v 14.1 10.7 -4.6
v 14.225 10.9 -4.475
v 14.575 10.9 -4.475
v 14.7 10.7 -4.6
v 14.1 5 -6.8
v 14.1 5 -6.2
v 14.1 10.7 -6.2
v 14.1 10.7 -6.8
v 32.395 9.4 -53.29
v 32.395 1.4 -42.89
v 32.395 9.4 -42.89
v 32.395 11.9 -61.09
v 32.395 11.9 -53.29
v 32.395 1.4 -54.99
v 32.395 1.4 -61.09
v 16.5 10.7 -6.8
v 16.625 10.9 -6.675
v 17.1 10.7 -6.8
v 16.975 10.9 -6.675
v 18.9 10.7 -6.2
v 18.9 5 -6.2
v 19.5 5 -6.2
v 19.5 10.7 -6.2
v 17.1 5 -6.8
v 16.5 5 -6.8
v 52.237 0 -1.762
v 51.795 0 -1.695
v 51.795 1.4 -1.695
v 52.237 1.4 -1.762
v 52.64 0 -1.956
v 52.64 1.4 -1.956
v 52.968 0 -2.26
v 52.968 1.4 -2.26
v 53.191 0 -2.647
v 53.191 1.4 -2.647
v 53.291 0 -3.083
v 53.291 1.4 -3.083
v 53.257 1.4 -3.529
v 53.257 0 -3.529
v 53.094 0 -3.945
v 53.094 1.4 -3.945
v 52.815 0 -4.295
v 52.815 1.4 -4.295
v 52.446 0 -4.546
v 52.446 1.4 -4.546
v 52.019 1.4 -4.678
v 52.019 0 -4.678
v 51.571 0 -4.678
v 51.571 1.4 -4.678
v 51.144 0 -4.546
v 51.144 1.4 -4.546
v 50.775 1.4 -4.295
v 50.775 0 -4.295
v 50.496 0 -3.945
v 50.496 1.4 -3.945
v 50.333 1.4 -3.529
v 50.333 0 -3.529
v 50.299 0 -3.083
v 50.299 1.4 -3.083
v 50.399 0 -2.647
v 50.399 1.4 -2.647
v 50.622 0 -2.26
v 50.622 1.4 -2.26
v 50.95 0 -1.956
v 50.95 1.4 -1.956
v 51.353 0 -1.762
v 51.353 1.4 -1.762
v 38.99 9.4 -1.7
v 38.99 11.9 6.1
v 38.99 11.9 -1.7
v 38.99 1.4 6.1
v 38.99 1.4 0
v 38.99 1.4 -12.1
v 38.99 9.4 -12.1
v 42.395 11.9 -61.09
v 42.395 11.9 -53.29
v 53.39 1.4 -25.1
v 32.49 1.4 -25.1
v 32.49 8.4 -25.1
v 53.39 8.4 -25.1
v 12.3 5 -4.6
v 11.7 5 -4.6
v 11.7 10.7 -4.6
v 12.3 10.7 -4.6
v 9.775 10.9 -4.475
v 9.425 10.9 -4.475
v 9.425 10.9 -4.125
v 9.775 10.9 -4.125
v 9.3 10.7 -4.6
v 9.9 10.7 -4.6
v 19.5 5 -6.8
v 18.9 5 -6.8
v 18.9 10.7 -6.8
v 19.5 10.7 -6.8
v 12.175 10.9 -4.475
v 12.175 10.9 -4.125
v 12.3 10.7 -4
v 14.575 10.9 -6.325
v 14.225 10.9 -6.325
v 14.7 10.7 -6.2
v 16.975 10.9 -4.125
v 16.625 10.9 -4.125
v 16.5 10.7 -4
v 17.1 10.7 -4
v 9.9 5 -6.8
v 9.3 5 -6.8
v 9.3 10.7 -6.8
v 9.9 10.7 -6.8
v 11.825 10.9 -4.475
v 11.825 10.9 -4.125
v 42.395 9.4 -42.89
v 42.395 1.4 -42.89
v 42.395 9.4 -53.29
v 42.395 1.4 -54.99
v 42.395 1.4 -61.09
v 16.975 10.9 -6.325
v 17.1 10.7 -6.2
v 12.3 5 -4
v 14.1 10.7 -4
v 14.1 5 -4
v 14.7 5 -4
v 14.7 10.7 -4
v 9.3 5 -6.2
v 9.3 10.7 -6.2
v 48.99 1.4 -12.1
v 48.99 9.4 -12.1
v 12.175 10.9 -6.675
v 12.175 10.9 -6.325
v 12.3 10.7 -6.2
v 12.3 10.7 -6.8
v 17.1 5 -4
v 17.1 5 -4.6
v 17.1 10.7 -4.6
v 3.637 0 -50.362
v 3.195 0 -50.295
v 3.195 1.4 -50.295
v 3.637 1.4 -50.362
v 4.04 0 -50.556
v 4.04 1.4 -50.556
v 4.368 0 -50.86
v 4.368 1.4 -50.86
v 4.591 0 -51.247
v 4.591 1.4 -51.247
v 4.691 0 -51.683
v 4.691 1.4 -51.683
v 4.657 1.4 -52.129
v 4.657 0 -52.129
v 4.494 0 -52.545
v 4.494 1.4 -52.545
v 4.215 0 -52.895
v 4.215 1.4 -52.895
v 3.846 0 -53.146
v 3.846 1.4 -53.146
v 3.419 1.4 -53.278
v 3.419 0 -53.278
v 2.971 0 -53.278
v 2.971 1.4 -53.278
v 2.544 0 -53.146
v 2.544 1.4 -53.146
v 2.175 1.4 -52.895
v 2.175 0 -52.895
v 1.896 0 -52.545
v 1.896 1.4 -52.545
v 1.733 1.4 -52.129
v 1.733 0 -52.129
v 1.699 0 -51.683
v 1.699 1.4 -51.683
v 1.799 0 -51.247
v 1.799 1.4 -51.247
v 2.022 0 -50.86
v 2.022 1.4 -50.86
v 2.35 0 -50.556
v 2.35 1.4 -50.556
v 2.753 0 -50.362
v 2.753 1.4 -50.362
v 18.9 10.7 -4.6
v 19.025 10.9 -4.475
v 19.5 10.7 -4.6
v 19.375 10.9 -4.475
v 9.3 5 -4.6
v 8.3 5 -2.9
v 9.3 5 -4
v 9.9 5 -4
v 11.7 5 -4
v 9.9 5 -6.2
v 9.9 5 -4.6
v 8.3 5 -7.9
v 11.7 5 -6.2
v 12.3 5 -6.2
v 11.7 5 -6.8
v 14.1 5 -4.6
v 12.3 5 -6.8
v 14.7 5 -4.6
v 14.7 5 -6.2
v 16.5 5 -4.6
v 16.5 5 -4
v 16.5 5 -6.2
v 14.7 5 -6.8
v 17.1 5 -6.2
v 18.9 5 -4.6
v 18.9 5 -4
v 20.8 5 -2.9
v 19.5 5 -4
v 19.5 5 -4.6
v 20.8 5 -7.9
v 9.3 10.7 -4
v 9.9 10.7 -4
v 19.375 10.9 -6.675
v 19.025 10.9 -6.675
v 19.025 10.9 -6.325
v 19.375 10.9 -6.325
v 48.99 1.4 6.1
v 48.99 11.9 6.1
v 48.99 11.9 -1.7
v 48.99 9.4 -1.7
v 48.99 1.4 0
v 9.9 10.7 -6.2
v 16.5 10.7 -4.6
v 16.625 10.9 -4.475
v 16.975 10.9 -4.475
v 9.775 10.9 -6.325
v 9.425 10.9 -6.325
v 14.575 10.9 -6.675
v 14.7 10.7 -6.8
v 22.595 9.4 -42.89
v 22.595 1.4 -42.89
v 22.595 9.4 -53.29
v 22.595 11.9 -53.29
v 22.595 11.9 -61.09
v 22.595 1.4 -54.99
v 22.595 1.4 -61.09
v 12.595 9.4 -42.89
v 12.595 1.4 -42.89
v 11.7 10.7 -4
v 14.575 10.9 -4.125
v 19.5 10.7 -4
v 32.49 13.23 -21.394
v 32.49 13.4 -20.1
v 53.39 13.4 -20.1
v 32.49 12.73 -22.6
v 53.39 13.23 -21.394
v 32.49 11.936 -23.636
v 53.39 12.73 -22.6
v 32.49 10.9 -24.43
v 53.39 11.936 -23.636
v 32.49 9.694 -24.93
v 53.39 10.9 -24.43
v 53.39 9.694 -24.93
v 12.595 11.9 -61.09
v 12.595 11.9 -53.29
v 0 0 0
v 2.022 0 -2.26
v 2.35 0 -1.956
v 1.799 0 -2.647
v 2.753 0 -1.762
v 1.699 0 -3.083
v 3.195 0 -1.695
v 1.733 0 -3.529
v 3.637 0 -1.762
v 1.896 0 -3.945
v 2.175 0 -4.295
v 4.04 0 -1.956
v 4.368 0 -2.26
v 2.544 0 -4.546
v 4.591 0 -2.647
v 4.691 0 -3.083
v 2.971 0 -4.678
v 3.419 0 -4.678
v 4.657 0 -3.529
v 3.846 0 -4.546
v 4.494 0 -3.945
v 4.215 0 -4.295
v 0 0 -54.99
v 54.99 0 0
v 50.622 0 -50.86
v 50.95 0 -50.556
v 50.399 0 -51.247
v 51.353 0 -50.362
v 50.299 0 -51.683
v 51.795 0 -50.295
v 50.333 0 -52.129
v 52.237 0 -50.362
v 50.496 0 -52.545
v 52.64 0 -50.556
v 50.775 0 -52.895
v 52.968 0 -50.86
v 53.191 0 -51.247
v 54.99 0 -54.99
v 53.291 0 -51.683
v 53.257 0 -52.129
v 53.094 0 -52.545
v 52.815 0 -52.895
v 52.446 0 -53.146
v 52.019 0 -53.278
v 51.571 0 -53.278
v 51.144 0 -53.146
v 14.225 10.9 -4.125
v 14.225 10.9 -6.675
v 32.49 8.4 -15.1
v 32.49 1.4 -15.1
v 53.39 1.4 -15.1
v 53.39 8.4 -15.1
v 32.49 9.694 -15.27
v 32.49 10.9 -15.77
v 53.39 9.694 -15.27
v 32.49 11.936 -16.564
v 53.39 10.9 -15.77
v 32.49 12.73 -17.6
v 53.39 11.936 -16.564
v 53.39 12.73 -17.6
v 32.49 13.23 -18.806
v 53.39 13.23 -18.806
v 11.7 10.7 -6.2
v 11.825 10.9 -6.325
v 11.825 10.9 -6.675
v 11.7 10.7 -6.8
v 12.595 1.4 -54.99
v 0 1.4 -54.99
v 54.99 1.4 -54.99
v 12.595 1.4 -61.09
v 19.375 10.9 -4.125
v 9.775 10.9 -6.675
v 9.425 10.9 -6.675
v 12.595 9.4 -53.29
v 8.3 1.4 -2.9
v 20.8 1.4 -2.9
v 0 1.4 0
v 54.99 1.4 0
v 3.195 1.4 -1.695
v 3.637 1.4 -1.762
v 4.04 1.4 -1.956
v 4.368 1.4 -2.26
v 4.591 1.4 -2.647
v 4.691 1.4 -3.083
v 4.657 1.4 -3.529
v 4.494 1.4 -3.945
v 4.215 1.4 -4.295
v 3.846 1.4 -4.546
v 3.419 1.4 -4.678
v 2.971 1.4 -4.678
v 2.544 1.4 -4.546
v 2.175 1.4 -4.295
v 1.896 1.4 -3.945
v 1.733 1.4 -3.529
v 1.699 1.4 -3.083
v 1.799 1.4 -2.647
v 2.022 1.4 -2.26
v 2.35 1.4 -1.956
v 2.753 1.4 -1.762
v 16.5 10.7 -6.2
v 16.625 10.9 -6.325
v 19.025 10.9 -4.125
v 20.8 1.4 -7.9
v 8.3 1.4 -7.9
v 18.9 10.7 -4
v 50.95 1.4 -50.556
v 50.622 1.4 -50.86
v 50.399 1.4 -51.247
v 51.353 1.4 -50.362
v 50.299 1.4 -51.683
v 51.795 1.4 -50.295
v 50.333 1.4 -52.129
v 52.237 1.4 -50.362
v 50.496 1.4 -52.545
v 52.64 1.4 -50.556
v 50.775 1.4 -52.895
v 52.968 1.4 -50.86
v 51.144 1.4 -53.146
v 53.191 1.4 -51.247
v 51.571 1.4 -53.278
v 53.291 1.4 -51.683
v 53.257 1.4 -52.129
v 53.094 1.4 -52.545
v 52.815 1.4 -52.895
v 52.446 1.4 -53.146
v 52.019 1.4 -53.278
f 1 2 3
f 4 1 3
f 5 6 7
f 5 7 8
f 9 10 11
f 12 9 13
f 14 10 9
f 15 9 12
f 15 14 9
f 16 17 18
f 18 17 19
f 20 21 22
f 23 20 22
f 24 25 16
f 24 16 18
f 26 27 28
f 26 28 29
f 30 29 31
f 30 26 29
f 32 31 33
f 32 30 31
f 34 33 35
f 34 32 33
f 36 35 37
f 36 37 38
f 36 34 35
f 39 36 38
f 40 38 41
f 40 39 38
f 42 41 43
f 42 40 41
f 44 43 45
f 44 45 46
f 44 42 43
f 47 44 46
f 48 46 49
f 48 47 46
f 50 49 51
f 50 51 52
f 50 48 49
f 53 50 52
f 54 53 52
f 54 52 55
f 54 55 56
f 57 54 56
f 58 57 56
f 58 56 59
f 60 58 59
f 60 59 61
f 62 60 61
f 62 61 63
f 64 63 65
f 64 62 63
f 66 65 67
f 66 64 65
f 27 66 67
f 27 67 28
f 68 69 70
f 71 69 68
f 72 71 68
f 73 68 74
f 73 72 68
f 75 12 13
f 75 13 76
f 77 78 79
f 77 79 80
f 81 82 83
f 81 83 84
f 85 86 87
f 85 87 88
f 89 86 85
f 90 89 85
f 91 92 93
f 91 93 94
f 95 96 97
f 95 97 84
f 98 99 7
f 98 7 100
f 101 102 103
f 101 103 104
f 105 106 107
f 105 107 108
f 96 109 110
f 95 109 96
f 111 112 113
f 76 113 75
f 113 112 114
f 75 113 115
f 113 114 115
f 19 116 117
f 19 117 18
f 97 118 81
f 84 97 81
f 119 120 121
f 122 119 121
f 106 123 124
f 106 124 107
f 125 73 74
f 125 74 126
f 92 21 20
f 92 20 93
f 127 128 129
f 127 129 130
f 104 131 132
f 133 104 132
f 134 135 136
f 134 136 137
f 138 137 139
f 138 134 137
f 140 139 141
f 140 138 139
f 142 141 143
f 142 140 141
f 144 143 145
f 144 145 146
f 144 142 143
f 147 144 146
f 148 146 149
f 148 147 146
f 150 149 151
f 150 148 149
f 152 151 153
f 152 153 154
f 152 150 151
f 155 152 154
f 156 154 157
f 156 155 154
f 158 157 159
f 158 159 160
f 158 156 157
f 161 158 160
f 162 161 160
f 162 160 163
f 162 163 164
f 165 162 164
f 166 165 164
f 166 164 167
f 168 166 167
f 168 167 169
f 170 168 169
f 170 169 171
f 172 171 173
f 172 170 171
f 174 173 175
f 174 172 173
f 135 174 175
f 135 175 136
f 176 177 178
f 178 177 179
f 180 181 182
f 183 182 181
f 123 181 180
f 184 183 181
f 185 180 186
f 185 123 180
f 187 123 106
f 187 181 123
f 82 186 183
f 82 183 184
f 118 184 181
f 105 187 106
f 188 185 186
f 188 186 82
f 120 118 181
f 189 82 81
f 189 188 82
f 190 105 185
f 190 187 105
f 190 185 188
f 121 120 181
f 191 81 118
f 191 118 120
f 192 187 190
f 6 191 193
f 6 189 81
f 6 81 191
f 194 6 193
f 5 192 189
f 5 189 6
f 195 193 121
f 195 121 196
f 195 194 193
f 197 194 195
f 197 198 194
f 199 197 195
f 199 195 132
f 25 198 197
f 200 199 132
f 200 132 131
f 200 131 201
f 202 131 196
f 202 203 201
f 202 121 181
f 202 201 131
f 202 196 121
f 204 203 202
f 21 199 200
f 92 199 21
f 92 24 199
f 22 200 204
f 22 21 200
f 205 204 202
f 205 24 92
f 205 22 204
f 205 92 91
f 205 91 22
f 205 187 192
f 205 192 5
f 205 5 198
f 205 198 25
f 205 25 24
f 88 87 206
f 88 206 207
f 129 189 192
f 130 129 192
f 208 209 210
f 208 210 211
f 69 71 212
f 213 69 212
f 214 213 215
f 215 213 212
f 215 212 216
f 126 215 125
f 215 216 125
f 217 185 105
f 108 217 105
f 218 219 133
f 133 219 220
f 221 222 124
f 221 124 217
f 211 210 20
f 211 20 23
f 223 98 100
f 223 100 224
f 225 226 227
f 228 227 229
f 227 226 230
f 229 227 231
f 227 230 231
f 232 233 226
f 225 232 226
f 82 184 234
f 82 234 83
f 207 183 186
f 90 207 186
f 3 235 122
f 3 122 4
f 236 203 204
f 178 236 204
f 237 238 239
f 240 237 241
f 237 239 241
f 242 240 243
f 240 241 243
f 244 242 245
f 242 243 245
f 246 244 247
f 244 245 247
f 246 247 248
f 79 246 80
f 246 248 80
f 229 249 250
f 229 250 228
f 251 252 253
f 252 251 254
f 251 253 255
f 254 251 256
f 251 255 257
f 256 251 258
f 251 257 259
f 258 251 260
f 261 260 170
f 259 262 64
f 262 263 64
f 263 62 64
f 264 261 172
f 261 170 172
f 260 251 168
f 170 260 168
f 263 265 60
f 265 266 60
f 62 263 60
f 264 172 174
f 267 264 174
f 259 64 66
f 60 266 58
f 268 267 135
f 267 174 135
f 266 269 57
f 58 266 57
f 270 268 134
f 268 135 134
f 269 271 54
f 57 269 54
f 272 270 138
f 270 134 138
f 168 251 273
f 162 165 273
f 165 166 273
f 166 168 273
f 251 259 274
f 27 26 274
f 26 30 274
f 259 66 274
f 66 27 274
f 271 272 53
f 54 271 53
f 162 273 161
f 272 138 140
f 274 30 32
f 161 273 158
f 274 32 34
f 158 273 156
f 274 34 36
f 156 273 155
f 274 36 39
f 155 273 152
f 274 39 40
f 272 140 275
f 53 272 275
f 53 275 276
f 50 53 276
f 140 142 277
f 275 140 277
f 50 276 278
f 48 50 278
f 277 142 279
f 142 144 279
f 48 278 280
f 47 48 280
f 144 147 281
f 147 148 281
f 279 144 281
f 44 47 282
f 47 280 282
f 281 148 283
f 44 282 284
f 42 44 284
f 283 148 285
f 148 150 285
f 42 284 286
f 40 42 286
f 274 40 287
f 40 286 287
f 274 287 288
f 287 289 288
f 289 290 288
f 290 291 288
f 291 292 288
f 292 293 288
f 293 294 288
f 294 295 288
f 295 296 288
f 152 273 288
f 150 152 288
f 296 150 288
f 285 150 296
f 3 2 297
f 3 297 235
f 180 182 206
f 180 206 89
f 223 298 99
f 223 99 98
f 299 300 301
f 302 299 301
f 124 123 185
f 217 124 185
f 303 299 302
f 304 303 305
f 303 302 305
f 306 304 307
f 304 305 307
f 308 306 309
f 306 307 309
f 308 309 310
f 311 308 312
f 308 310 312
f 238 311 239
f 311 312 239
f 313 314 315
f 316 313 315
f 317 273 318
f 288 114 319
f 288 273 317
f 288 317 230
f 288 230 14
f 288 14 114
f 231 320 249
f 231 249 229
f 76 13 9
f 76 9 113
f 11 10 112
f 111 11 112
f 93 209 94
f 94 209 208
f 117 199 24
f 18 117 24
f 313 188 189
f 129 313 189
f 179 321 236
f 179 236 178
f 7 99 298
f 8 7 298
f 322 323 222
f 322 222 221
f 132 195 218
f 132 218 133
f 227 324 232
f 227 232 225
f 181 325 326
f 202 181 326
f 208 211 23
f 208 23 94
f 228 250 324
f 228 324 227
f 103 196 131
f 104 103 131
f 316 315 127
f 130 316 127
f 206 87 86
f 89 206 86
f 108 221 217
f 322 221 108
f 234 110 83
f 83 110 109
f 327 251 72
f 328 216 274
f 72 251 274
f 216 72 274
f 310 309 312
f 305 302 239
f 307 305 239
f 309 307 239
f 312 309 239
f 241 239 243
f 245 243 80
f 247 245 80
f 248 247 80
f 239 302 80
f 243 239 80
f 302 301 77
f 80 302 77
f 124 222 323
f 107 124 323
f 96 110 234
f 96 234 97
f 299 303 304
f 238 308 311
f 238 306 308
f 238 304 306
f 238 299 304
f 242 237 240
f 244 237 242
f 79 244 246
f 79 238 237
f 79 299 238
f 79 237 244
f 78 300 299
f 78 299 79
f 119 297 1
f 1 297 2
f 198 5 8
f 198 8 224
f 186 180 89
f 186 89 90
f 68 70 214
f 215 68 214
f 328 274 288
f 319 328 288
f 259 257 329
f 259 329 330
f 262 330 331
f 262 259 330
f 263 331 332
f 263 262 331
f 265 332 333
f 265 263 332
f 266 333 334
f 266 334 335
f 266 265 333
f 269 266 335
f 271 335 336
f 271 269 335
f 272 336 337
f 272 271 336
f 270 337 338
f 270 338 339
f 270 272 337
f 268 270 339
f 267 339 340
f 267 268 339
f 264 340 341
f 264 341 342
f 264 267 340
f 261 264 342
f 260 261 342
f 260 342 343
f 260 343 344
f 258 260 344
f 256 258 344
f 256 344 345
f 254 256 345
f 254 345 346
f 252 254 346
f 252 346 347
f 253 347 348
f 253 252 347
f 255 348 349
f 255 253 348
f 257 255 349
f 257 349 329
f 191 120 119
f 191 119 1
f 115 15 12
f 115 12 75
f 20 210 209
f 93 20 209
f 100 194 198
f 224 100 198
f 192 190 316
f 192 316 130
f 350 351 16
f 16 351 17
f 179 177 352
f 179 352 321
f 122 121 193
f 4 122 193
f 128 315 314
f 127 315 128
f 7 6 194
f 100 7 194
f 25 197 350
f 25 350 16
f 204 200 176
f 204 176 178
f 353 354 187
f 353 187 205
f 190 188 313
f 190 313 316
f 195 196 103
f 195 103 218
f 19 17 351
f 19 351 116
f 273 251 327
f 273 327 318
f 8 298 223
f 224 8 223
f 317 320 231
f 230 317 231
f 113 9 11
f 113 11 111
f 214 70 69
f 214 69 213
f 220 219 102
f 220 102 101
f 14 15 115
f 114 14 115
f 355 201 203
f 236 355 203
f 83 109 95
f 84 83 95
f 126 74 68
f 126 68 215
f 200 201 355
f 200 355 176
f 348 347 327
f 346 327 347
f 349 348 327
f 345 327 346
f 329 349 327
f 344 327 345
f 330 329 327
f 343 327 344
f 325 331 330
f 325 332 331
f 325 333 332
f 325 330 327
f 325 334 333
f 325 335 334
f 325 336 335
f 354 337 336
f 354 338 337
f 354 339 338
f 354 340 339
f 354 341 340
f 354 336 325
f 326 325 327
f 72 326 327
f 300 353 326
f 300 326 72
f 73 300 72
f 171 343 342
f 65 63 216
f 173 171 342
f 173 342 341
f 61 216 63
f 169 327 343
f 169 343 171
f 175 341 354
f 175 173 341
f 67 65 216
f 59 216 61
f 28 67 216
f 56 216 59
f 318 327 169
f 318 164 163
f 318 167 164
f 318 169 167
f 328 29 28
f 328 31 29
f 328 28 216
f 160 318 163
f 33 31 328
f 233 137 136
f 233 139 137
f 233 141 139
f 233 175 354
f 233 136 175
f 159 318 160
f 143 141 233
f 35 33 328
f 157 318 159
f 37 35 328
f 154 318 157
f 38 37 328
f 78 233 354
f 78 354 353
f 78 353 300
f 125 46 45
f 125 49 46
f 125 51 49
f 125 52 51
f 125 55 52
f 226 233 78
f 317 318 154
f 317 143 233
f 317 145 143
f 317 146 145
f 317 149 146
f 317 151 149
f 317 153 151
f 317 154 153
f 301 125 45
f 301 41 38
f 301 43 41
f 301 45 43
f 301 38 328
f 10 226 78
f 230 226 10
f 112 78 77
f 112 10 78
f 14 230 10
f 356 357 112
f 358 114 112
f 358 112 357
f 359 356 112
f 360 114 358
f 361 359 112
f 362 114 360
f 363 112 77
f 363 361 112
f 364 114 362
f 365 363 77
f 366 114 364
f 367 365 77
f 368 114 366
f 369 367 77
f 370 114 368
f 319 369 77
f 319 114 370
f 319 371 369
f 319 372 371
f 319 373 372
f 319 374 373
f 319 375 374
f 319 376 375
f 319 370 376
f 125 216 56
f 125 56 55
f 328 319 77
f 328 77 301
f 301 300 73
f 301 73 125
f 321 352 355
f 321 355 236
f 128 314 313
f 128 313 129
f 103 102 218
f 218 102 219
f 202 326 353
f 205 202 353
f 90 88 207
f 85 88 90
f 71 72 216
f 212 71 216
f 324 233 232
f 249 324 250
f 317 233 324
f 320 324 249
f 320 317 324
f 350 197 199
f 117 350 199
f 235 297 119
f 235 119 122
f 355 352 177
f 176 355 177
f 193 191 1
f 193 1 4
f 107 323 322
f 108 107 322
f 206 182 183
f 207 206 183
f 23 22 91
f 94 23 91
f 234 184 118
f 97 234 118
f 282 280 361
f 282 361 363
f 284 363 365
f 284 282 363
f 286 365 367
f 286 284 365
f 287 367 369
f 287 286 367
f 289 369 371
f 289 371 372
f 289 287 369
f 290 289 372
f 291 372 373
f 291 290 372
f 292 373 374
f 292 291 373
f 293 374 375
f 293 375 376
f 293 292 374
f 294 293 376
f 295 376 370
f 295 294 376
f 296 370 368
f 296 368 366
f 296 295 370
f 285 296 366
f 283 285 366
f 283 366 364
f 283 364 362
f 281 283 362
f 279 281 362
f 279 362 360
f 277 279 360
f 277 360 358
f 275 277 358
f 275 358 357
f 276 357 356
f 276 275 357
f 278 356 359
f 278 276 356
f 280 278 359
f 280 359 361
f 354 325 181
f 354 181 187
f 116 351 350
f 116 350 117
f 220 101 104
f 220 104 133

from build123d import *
from OCP.BRepFilletAPI import BRepFilletAPI_MakeChamfer

# Parameters (mm, degrees)
SKETCH1_W                   = 54.99
SKETCH1_H                   = 54.99
SKETCH1_R                   = 1.5
BOSS_EXTRUDE1_DEPTH         = 1.4
SKETCH2_W                   = 10
SKETCH2_H                   = 18.2
BOSS_EXTRUDE2_DEPTH         = 10.5
SKETCH3_W                   = 10
SKETCH3_H                   = 10.4
CUT_EXTRUDE1_DEPTH          = 2.5
SKETCH4_W                   = 12.5
SKETCH4_H                   = 5
BOSS_EXTRUDE4_DEPTH         = 3.6
SKETCH5_W                   = 0.6
SKETCH5_H                   = 0.6
BOSS_EXTRUDE5_DEPTH         = 5.9
CHAMFER1_SIZE               = 0.2
CHAMFER1_SIZE2              = 0.12497387
LPATTERN1_COUNT             = 5
LPATTERN1_PITCH             = 2.4
CHAMFER1_OF_LPATTERN1_SIZE  = 0.2
CHAMFER1_OF_LPATTERN1_SIZE2 = 0.12497387
SKETCH6_W                   = 20.9
SKETCH6_H                   = 10
BOSS_EXTRUDE6_DEPTH         = 12
CUT_EXTRUDE2_DEPTH          = 83.231625303


with BuildPart() as part:
    # Sketch1 → Boss-Extrude1 (new body)
    with BuildSketch(Plane(origin=(0, 0, 0), x_dir=(1, 0, 0), z_dir=(0, 1, 0))):
        with Locations((27.495, 27.495)):
            Rectangle(SKETCH1_W, SKETCH1_H)
        with Locations(Location((3.195, 51.795, 0), (0, 0, 270))):
            Circle(SKETCH1_R, mode=Mode.SUBTRACT)
        with Locations(Location((51.795, 51.795, 0), (0, 0, 270))):
            Circle(SKETCH1_R, mode=Mode.SUBTRACT)
        with Locations(Location((3.195, 3.195, 0), (0, 0, 270))):
            Circle(SKETCH1_R, mode=Mode.SUBTRACT)
        with Locations(Location((51.795, 3.195, 0), (0, 0, 270))):
            Circle(SKETCH1_R, mode=Mode.SUBTRACT)
    extrude(amount=BOSS_EXTRUDE1_DEPTH)

    # Sketch2 → Boss-Extrude2 (add)
    with BuildSketch(Plane(origin=(0, 1.4, 0), x_dir=(1, 0, 0), z_dir=(0, 1, 0))):
        with Locations((17.595, 51.99)):
            Rectangle(SKETCH2_W, SKETCH2_H)
        with Locations((37.395, 51.99)):
            Rectangle(SKETCH2_W, SKETCH2_H)
        with Locations((43.99, 3)):
            Rectangle(SKETCH2_W, SKETCH2_H)
    extrude(amount=BOSS_EXTRUDE2_DEPTH)

    # Sketch3 → Cut-Extrude1 (cut)
    with BuildSketch(Plane(origin=(0, 11.9, 0), x_dir=(1, 0, 0), z_dir=(0, 1, 0))):
        with Locations((37.395, 48.09)):
            Rectangle(SKETCH3_W, SKETCH3_H)
        with Locations((17.595, 48.09)):
            Rectangle(SKETCH3_W, SKETCH3_H)
        with Locations((43.99, 6.9)):
            Rectangle(SKETCH3_W, SKETCH3_H)
    extrude(amount=-CUT_EXTRUDE1_DEPTH, mode=Mode.SUBTRACT)

    # Sketch4 → Boss-Extrude4 (add)
    with BuildSketch(Plane(origin=(0, 1.4, 0), x_dir=(1, 0, 0), z_dir=(0, 1, 0))):
        with Locations((14.55, 5.4)):
            Rectangle(SKETCH4_W, SKETCH4_H)
    extrude(amount=BOSS_EXTRUDE4_DEPTH)

    # Sketch5 → Boss-Extrude5 (add)
    with BuildSketch(Plane(origin=(0, 5, 0), x_dir=(1, 0, 0), z_dir=(0, 1, 0))):
        with Locations((9.6, 6.5)):
            Rectangle(SKETCH5_W, SKETCH5_H)
        with Locations((9.6, 4.3)):
            Rectangle(SKETCH5_W, SKETCH5_H)
    boss_extrude5 = extrude(amount=BOSS_EXTRUDE5_DEPTH)

    # Chamfer1: one chamfer whose edges measure the first distance from different faces: ONE call of the kernel's chamfer builder (chamfer() names one face for all edges)
    chamfer1_edges_1 = [part.edges().sort_by_distance(p)[0] for p in [
        (9.3, 10.9, -6.5),
    ]]
    chamfer1_side_1 = [part.faces().sort_by_distance(p)[0] for p in [
        (9.3, 7.95, -6.5),
    ]]
    chamfer1_edges_2 = [part.edges().sort_by_distance(p)[0] for p in [
        (9.6, 10.9, -6.2),
    ]]
    chamfer1_side_2 = [part.faces().sort_by_distance(p)[0] for p in [
        (9.6, 7.95, -6.2),
    ]]
    chamfer1_edges_3 = [part.edges().sort_by_distance(p)[0] for p in [
        (9.9, 10.9, -6.5),
    ]]
    chamfer1_side_3 = [part.faces().sort_by_distance(p)[0] for p in [
        (9.9, 7.95, -6.5),
    ]]
    chamfer1_edges_4 = [part.edges().sort_by_distance(p)[0] for p in [
        (9.6, 10.9, -6.8),
    ]]
    chamfer1_side_4 = [part.faces().sort_by_distance(p)[0] for p in [
        (9.6, 7.95, -6.8),
    ]]
    chamfer1_edges_5 = [part.edges().sort_by_distance(p)[0] for p in [
        (9.3, 10.9, -4.3),
    ]]
    chamfer1_side_5 = [part.faces().sort_by_distance(p)[0] for p in [
        (9.3, 7.95, -4.3),
    ]]
    chamfer1_edges_6 = [part.edges().sort_by_distance(p)[0] for p in [
        (9.6, 10.9, -4),
    ]]
    chamfer1_side_6 = [part.faces().sort_by_distance(p)[0] for p in [
        (9.6, 7.95, -4),
    ]]
    chamfer1_edges_7 = [part.edges().sort_by_distance(p)[0] for p in [
        (9.9, 10.9, -4.3),
    ]]
    chamfer1_side_7 = [part.faces().sort_by_distance(p)[0] for p in [
        (9.9, 7.95, -4.3),
    ]]
    chamfer1_edges_8 = [part.edges().sort_by_distance(p)[0] for p in [
        (9.6, 10.9, -4.6),
    ]]
    chamfer1_side_8 = [part.faces().sort_by_distance(p)[0] for p in [
        (9.6, 7.95, -4.6),
    ]]
    chamfer1 = BRepFilletAPI_MakeChamfer(part.part.solid().wrapped)
    for e in chamfer1_edges_1:
        chamfer1.Add(CHAMFER1_SIZE, CHAMFER1_SIZE2, e.wrapped, chamfer1_side_1[0].wrapped)  # the first distance lies on this face
    for e in chamfer1_edges_2:
        chamfer1.Add(CHAMFER1_SIZE, CHAMFER1_SIZE2, e.wrapped, chamfer1_side_2[0].wrapped)  # the first distance lies on this face
    for e in chamfer1_edges_3:
        chamfer1.Add(CHAMFER1_SIZE, CHAMFER1_SIZE2, e.wrapped, chamfer1_side_3[0].wrapped)  # the first distance lies on this face
    for e in chamfer1_edges_4:
        chamfer1.Add(CHAMFER1_SIZE, CHAMFER1_SIZE2, e.wrapped, chamfer1_side_4[0].wrapped)  # the first distance lies on this face
    for e in chamfer1_edges_5:
        chamfer1.Add(CHAMFER1_SIZE, CHAMFER1_SIZE2, e.wrapped, chamfer1_side_5[0].wrapped)  # the first distance lies on this face
    for e in chamfer1_edges_6:
        chamfer1.Add(CHAMFER1_SIZE, CHAMFER1_SIZE2, e.wrapped, chamfer1_side_6[0].wrapped)  # the first distance lies on this face
    for e in chamfer1_edges_7:
        chamfer1.Add(CHAMFER1_SIZE, CHAMFER1_SIZE2, e.wrapped, chamfer1_side_7[0].wrapped)  # the first distance lies on this face
    for e in chamfer1_edges_8:
        chamfer1.Add(CHAMFER1_SIZE, CHAMFER1_SIZE2, e.wrapped, chamfer1_side_8[0].wrapped)  # the first distance lies on this face
    add(Compound.cast(chamfer1.Shape()), mode=Mode.REPLACE)

    # LPattern1: Boss-Extrude5 ×5
    with Locations(*[(i * LPATTERN1_PITCH, 0, 0) for i in range(1, LPATTERN1_COUNT)]):
        add(boss_extrude5)

    # Chamfer1 of LPattern1: one chamfer whose edges measure the first distance from different faces: ONE call of the kernel's chamfer builder (chamfer() names one face for all edges)
    chamfer1_of_lpattern1_edges_1 = [part.edges().sort_by_distance(p)[0] for p in [
        (11.7, 10.9, -6.5),
    ]]
    chamfer1_of_lpattern1_side_1 = [part.faces().sort_by_distance(p)[0] for p in [
        (11.7, 7.95, -6.5),
    ]]
    chamfer1_of_lpattern1_edges_2 = [part.edges().sort_by_distance(p)[0] for p in [
        (12, 10.9, -6.2),
    ]]
    chamfer1_of_lpattern1_side_2 = [part.faces().sort_by_distance(p)[0] for p in [
        (12, 7.95, -6.2),
    ]]
    chamfer1_of_lpattern1_edges_3 = [part.edges().sort_by_distance(p)[0] for p in [
        (12.3, 10.9, -6.5),
    ]]
    chamfer1_of_lpattern1_side_3 = [part.faces().sort_by_distance(p)[0] for p in [
        (12.3, 7.95, -6.5),
    ]]
    chamfer1_of_lpattern1_edges_4 = [part.edges().sort_by_distance(p)[0] for p in [
        (12, 10.9, -6.8),
    ]]
    chamfer1_of_lpattern1_side_4 = [part.faces().sort_by_distance(p)[0] for p in [
        (12, 7.95, -6.8),
    ]]
    chamfer1_of_lpattern1_edges_5 = [part.edges().sort_by_distance(p)[0] for p in [
        (11.7, 10.9, -4.3),
    ]]
    chamfer1_of_lpattern1_side_5 = [part.faces().sort_by_distance(p)[0] for p in [
        (11.7, 7.95, -4.3),
    ]]
    chamfer1_of_lpattern1_edges_6 = [part.edges().sort_by_distance(p)[0] for p in [
        (12, 10.9, -4),
    ]]
    chamfer1_of_lpattern1_side_6 = [part.faces().sort_by_distance(p)[0] for p in [
        (12, 7.95, -4),
    ]]
    chamfer1_of_lpattern1_edges_7 = [part.edges().sort_by_distance(p)[0] for p in [
        (12.3, 10.9, -4.3),
    ]]
    chamfer1_of_lpattern1_side_7 = [part.faces().sort_by_distance(p)[0] for p in [
        (12.3, 7.95, -4.3),
    ]]
    chamfer1_of_lpattern1_edges_8 = [part.edges().sort_by_distance(p)[0] for p in [
        (12, 10.9, -4.6),
    ]]
    chamfer1_of_lpattern1_side_8 = [part.faces().sort_by_distance(p)[0] for p in [
        (12, 7.95, -4.6),
    ]]
    chamfer1_of_lpattern1_edges_9 = [part.edges().sort_by_distance(p)[0] for p in [
        (14.1, 10.9, -6.5),
    ]]
    chamfer1_of_lpattern1_side_9 = [part.faces().sort_by_distance(p)[0] for p in [
        (14.1, 7.95, -6.5),
    ]]
    chamfer1_of_lpattern1_edges_10 = [part.edges().sort_by_distance(p)[0] for p in [
        (14.4, 10.9, -6.2),
    ]]
    chamfer1_of_lpattern1_side_10 = [part.faces().sort_by_distance(p)[0] for p in [
        (14.4, 7.95, -6.2),
    ]]
    chamfer1_of_lpattern1_edges_11 = [part.edges().sort_by_distance(p)[0] for p in [
        (14.7, 10.9, -6.5),
    ]]
    chamfer1_of_lpattern1_side_11 = [part.faces().sort_by_distance(p)[0] for p in [
        (14.7, 7.95, -6.5),
    ]]
    chamfer1_of_lpattern1_edges_12 = [part.edges().sort_by_distance(p)[0] for p in [
        (14.4, 10.9, -6.8),
    ]]
    chamfer1_of_lpattern1_side_12 = [part.faces().sort_by_distance(p)[0] for p in [
        (14.4, 7.95, -6.8),
    ]]
    chamfer1_of_lpattern1_edges_13 = [part.edges().sort_by_distance(p)[0] for p in [
        (14.1, 10.9, -4.3),
    ]]
    chamfer1_of_lpattern1_side_13 = [part.faces().sort_by_distance(p)[0] for p in [
        (14.1, 7.95, -4.3),
    ]]
    chamfer1_of_lpattern1_edges_14 = [part.edges().sort_by_distance(p)[0] for p in [
        (14.4, 10.9, -4),
    ]]
    chamfer1_of_lpattern1_side_14 = [part.faces().sort_by_distance(p)[0] for p in [
        (14.4, 7.95, -4),
    ]]
    chamfer1_of_lpattern1_edges_15 = [part.edges().sort_by_distance(p)[0] for p in [
        (14.7, 10.9, -4.3),
    ]]
    chamfer1_of_lpattern1_side_15 = [part.faces().sort_by_distance(p)[0] for p in [
        (14.7, 7.95, -4.3),
    ]]
    chamfer1_of_lpattern1_edges_16 = [part.edges().sort_by_distance(p)[0] for p in [
        (14.4, 10.9, -4.6),
    ]]
    chamfer1_of_lpattern1_side_16 = [part.faces().sort_by_distance(p)[0] for p in [
        (14.4, 7.95, -4.6),
    ]]
    chamfer1_of_lpattern1_edges_17 = [part.edges().sort_by_distance(p)[0] for p in [
        (16.5, 10.9, -6.5),
    ]]
    chamfer1_of_lpattern1_side_17 = [part.faces().sort_by_distance(p)[0] for p in [
        (16.5, 7.95, -6.5),
    ]]
    chamfer1_of_lpattern1_edges_18 = [part.edges().sort_by_distance(p)[0] for p in [
        (16.8, 10.9, -6.2),
    ]]
    chamfer1_of_lpattern1_side_18 = [part.faces().sort_by_distance(p)[0] for p in [
        (16.8, 7.95, -6.2),
    ]]
    chamfer1_of_lpattern1_edges_19 = [part.edges().sort_by_distance(p)[0] for p in [
        (17.1, 10.9, -6.5),
    ]]
    chamfer1_of_lpattern1_side_19 = [part.faces().sort_by_distance(p)[0] for p in [
        (17.1, 7.95, -6.5),
    ]]
    chamfer1_of_lpattern1_edges_20 = [part.edges().sort_by_distance(p)[0] for p in [
        (16.8, 10.9, -6.8),
    ]]
    chamfer1_of_lpattern1_side_20 = [part.faces().sort_by_distance(p)[0] for p in [
        (16.8, 7.95, -6.8),
    ]]
    chamfer1_of_lpattern1_edges_21 = [part.edges().sort_by_distance(p)[0] for p in [
        (16.5, 10.9, -4.3),
    ]]
    chamfer1_of_lpattern1_side_21 = [part.faces().sort_by_distance(p)[0] for p in [
        (16.5, 7.95, -4.3),
    ]]
    chamfer1_of_lpattern1_edges_22 = [part.edges().sort_by_distance(p)[0] for p in [
        (16.8, 10.9, -4),
    ]]
    chamfer1_of_lpattern1_side_22 = [part.faces().sort_by_distance(p)[0] for p in [
        (16.8, 7.95, -4),
    ]]
    chamfer1_of_lpattern1_edges_23 = [part.edges().sort_by_distance(p)[0] for p in [
        (17.1, 10.9, -4.3),
    ]]
    chamfer1_of_lpattern1_side_23 = [part.faces().sort_by_distance(p)[0] for p in [
        (17.1, 7.95, -4.3),
    ]]
    chamfer1_of_lpattern1_edges_24 = [part.edges().sort_by_distance(p)[0] for p in [
        (16.8, 10.9, -4.6),
    ]]
    chamfer1_of_lpattern1_side_24 = [part.faces().sort_by_distance(p)[0] for p in [
        (16.8, 7.95, -4.6),
    ]]
    chamfer1_of_lpattern1_edges_25 = [part.edges().sort_by_distance(p)[0] for p in [
        (18.9, 10.9, -6.5),
    ]]
    chamfer1_of_lpattern1_side_25 = [part.faces().sort_by_distance(p)[0] for p in [
        (18.9, 7.95, -6.5),
    ]]
    chamfer1_of_lpattern1_edges_26 = [part.edges().sort_by_distance(p)[0] for p in [
        (19.2, 10.9, -6.2),
    ]]
    chamfer1_of_lpattern1_side_26 = [part.faces().sort_by_distance(p)[0] for p in [
        (19.2, 7.95, -6.2),
    ]]
    chamfer1_of_lpattern1_edges_27 = [part.edges().sort_by_distance(p)[0] for p in [
        (19.5, 10.9, -6.5),
    ]]
    chamfer1_of_lpattern1_side_27 = [part.faces().sort_by_distance(p)[0] for p in [
        (19.5, 7.95, -6.5),
    ]]
    chamfer1_of_lpattern1_edges_28 = [part.edges().sort_by_distance(p)[0] for p in [
        (19.2, 10.9, -6.8),
    ]]
    chamfer1_of_lpattern1_side_28 = [part.faces().sort_by_distance(p)[0] for p in [
        (19.2, 7.95, -6.8),
    ]]
    chamfer1_of_lpattern1_edges_29 = [part.edges().sort_by_distance(p)[0] for p in [
        (18.9, 10.9, -4.3),
    ]]
    chamfer1_of_lpattern1_side_29 = [part.faces().sort_by_distance(p)[0] for p in [
        (18.9, 7.95, -4.3),
    ]]
    chamfer1_of_lpattern1_edges_30 = [part.edges().sort_by_distance(p)[0] for p in [
        (19.2, 10.9, -4),
    ]]
    chamfer1_of_lpattern1_side_30 = [part.faces().sort_by_distance(p)[0] for p in [
        (19.2, 7.95, -4),
    ]]
    chamfer1_of_lpattern1_edges_31 = [part.edges().sort_by_distance(p)[0] for p in [
        (19.5, 10.9, -4.3),
    ]]
    chamfer1_of_lpattern1_side_31 = [part.faces().sort_by_distance(p)[0] for p in [
        (19.5, 7.95, -4.3),
    ]]
    chamfer1_of_lpattern1_edges_32 = [part.edges().sort_by_distance(p)[0] for p in [
        (19.2, 10.9, -4.6),
    ]]
    chamfer1_of_lpattern1_side_32 = [part.faces().sort_by_distance(p)[0] for p in [
        (19.2, 7.95, -4.6),
    ]]
    chamfer1_of_lpattern1 = BRepFilletAPI_MakeChamfer(part.part.solid().wrapped)
    for e in chamfer1_of_lpattern1_edges_1:
        chamfer1_of_lpattern1.Add(CHAMFER1_OF_LPATTERN1_SIZE, CHAMFER1_OF_LPATTERN1_SIZE2, e.wrapped, chamfer1_of_lpattern1_side_1[0].wrapped)  # the first distance lies on this face
    for e in chamfer1_of_lpattern1_edges_2:
        chamfer1_of_lpattern1.Add(CHAMFER1_OF_LPATTERN1_SIZE, CHAMFER1_OF_LPATTERN1_SIZE2, e.wrapped, chamfer1_of_lpattern1_side_2[0].wrapped)  # the first distance lies on this face
    for e in chamfer1_of_lpattern1_edges_3:
        chamfer1_of_lpattern1.Add(CHAMFER1_OF_LPATTERN1_SIZE, CHAMFER1_OF_LPATTERN1_SIZE2, e.wrapped, chamfer1_of_lpattern1_side_3[0].wrapped)  # the first distance lies on this face
    for e in chamfer1_of_lpattern1_edges_4:
        chamfer1_of_lpattern1.Add(CHAMFER1_OF_LPATTERN1_SIZE, CHAMFER1_OF_LPATTERN1_SIZE2, e.wrapped, chamfer1_of_lpattern1_side_4[0].wrapped)  # the first distance lies on this face
    for e in chamfer1_of_lpattern1_edges_5:
        chamfer1_of_lpattern1.Add(CHAMFER1_OF_LPATTERN1_SIZE, CHAMFER1_OF_LPATTERN1_SIZE2, e.wrapped, chamfer1_of_lpattern1_side_5[0].wrapped)  # the first distance lies on this face
    for e in chamfer1_of_lpattern1_edges_6:
        chamfer1_of_lpattern1.Add(CHAMFER1_OF_LPATTERN1_SIZE, CHAMFER1_OF_LPATTERN1_SIZE2, e.wrapped, chamfer1_of_lpattern1_side_6[0].wrapped)  # the first distance lies on this face
    for e in chamfer1_of_lpattern1_edges_7:
        chamfer1_of_lpattern1.Add(CHAMFER1_OF_LPATTERN1_SIZE, CHAMFER1_OF_LPATTERN1_SIZE2, e.wrapped, chamfer1_of_lpattern1_side_7[0].wrapped)  # the first distance lies on this face
    for e in chamfer1_of_lpattern1_edges_8:
        chamfer1_of_lpattern1.Add(CHAMFER1_OF_LPATTERN1_SIZE, CHAMFER1_OF_LPATTERN1_SIZE2, e.wrapped, chamfer1_of_lpattern1_side_8[0].wrapped)  # the first distance lies on this face
    for e in chamfer1_of_lpattern1_edges_9:
        chamfer1_of_lpattern1.Add(CHAMFER1_OF_LPATTERN1_SIZE, CHAMFER1_OF_LPATTERN1_SIZE2, e.wrapped, chamfer1_of_lpattern1_side_9[0].wrapped)  # the first distance lies on this face
    for e in chamfer1_of_lpattern1_edges_10:
        chamfer1_of_lpattern1.Add(CHAMFER1_OF_LPATTERN1_SIZE, CHAMFER1_OF_LPATTERN1_SIZE2, e.wrapped, chamfer1_of_lpattern1_side_10[0].wrapped)  # the first distance lies on this face
    for e in chamfer1_of_lpattern1_edges_11:
        chamfer1_of_lpattern1.Add(CHAMFER1_OF_LPATTERN1_SIZE, CHAMFER1_OF_LPATTERN1_SIZE2, e.wrapped, chamfer1_of_lpattern1_side_11[0].wrapped)  # the first distance lies on this face
    for e in chamfer1_of_lpattern1_edges_12:
        chamfer1_of_lpattern1.Add(CHAMFER1_OF_LPATTERN1_SIZE, CHAMFER1_OF_LPATTERN1_SIZE2, e.wrapped, chamfer1_of_lpattern1_side_12[0].wrapped)  # the first distance lies on this face
    for e in chamfer1_of_lpattern1_edges_13:
        chamfer1_of_lpattern1.Add(CHAMFER1_OF_LPATTERN1_SIZE, CHAMFER1_OF_LPATTERN1_SIZE2, e.wrapped, chamfer1_of_lpattern1_side_13[0].wrapped)  # the first distance lies on this face
    for e in chamfer1_of_lpattern1_edges_14:
        chamfer1_of_lpattern1.Add(CHAMFER1_OF_LPATTERN1_SIZE, CHAMFER1_OF_LPATTERN1_SIZE2, e.wrapped, chamfer1_of_lpattern1_side_14[0].wrapped)  # the first distance lies on this face
    for e in chamfer1_of_lpattern1_edges_15:
        chamfer1_of_lpattern1.Add(CHAMFER1_OF_LPATTERN1_SIZE, CHAMFER1_OF_LPATTERN1_SIZE2, e.wrapped, chamfer1_of_lpattern1_side_15[0].wrapped)  # the first distance lies on this face
    for e in chamfer1_of_lpattern1_edges_16:
        chamfer1_of_lpattern1.Add(CHAMFER1_OF_LPATTERN1_SIZE, CHAMFER1_OF_LPATTERN1_SIZE2, e.wrapped, chamfer1_of_lpattern1_side_16[0].wrapped)  # the first distance lies on this face
    for e in chamfer1_of_lpattern1_edges_17:
        chamfer1_of_lpattern1.Add(CHAMFER1_OF_LPATTERN1_SIZE, CHAMFER1_OF_LPATTERN1_SIZE2, e.wrapped, chamfer1_of_lpattern1_side_17[0].wrapped)  # the first distance lies on this face
    for e in chamfer1_of_lpattern1_edges_18:
        chamfer1_of_lpattern1.Add(CHAMFER1_OF_LPATTERN1_SIZE, CHAMFER1_OF_LPATTERN1_SIZE2, e.wrapped, chamfer1_of_lpattern1_side_18[0].wrapped)  # the first distance lies on this face
    for e in chamfer1_of_lpattern1_edges_19:
        chamfer1_of_lpattern1.Add(CHAMFER1_OF_LPATTERN1_SIZE, CHAMFER1_OF_LPATTERN1_SIZE2, e.wrapped, chamfer1_of_lpattern1_side_19[0].wrapped)  # the first distance lies on this face
    for e in chamfer1_of_lpattern1_edges_20:
        chamfer1_of_lpattern1.Add(CHAMFER1_OF_LPATTERN1_SIZE, CHAMFER1_OF_LPATTERN1_SIZE2, e.wrapped, chamfer1_of_lpattern1_side_20[0].wrapped)  # the first distance lies on this face
    for e in chamfer1_of_lpattern1_edges_21:
        chamfer1_of_lpattern1.Add(CHAMFER1_OF_LPATTERN1_SIZE, CHAMFER1_OF_LPATTERN1_SIZE2, e.wrapped, chamfer1_of_lpattern1_side_21[0].wrapped)  # the first distance lies on this face
    for e in chamfer1_of_lpattern1_edges_22:
        chamfer1_of_lpattern1.Add(CHAMFER1_OF_LPATTERN1_SIZE, CHAMFER1_OF_LPATTERN1_SIZE2, e.wrapped, chamfer1_of_lpattern1_side_22[0].wrapped)  # the first distance lies on this face
    for e in chamfer1_of_lpattern1_edges_23:
        chamfer1_of_lpattern1.Add(CHAMFER1_OF_LPATTERN1_SIZE, CHAMFER1_OF_LPATTERN1_SIZE2, e.wrapped, chamfer1_of_lpattern1_side_23[0].wrapped)  # the first distance lies on this face
    for e in chamfer1_of_lpattern1_edges_24:
        chamfer1_of_lpattern1.Add(CHAMFER1_OF_LPATTERN1_SIZE, CHAMFER1_OF_LPATTERN1_SIZE2, e.wrapped, chamfer1_of_lpattern1_side_24[0].wrapped)  # the first distance lies on this face
    for e in chamfer1_of_lpattern1_edges_25:
        chamfer1_of_lpattern1.Add(CHAMFER1_OF_LPATTERN1_SIZE, CHAMFER1_OF_LPATTERN1_SIZE2, e.wrapped, chamfer1_of_lpattern1_side_25[0].wrapped)  # the first distance lies on this face
    for e in chamfer1_of_lpattern1_edges_26:
        chamfer1_of_lpattern1.Add(CHAMFER1_OF_LPATTERN1_SIZE, CHAMFER1_OF_LPATTERN1_SIZE2, e.wrapped, chamfer1_of_lpattern1_side_26[0].wrapped)  # the first distance lies on this face
    for e in chamfer1_of_lpattern1_edges_27:
        chamfer1_of_lpattern1.Add(CHAMFER1_OF_LPATTERN1_SIZE, CHAMFER1_OF_LPATTERN1_SIZE2, e.wrapped, chamfer1_of_lpattern1_side_27[0].wrapped)  # the first distance lies on this face
    for e in chamfer1_of_lpattern1_edges_28:
        chamfer1_of_lpattern1.Add(CHAMFER1_OF_LPATTERN1_SIZE, CHAMFER1_OF_LPATTERN1_SIZE2, e.wrapped, chamfer1_of_lpattern1_side_28[0].wrapped)  # the first distance lies on this face
    for e in chamfer1_of_lpattern1_edges_29:
        chamfer1_of_lpattern1.Add(CHAMFER1_OF_LPATTERN1_SIZE, CHAMFER1_OF_LPATTERN1_SIZE2, e.wrapped, chamfer1_of_lpattern1_side_29[0].wrapped)  # the first distance lies on this face
    for e in chamfer1_of_lpattern1_edges_30:
        chamfer1_of_lpattern1.Add(CHAMFER1_OF_LPATTERN1_SIZE, CHAMFER1_OF_LPATTERN1_SIZE2, e.wrapped, chamfer1_of_lpattern1_side_30[0].wrapped)  # the first distance lies on this face
    for e in chamfer1_of_lpattern1_edges_31:
        chamfer1_of_lpattern1.Add(CHAMFER1_OF_LPATTERN1_SIZE, CHAMFER1_OF_LPATTERN1_SIZE2, e.wrapped, chamfer1_of_lpattern1_side_31[0].wrapped)  # the first distance lies on this face
    for e in chamfer1_of_lpattern1_edges_32:
        chamfer1_of_lpattern1.Add(CHAMFER1_OF_LPATTERN1_SIZE, CHAMFER1_OF_LPATTERN1_SIZE2, e.wrapped, chamfer1_of_lpattern1_side_32[0].wrapped)  # the first distance lies on this face
    add(Compound.cast(chamfer1_of_lpattern1.Shape()), mode=Mode.REPLACE)

    # Sketch6 → Boss-Extrude6 (add)
    with BuildSketch(Plane(origin=(0, 1.4, 0), x_dir=(1, 0, 0), z_dir=(0, 1, 0))):
        with Locations((42.94, 20.1)):
            Rectangle(SKETCH6_W, SKETCH6_H)
    extrude(amount=BOSS_EXTRUDE6_DEPTH)

    # Sketch7 → Cut-Extrude2 (cut, through all)
    with BuildSketch(Plane(origin=(53.39, 0, 0), x_dir=(0, 0, -1), z_dir=(1, 0, 0))):
        with BuildLine():
            Line((15.1, 13.4), (15.1, 8.4))
            ThreePointArc((15.1, 8.4), (16.564466094, 11.935533906), (20.1, 13.4))
            Line((20.1, 13.4), (15.1, 13.4))
        make_face()
        with BuildLine():
            Line((25.1, 13.4), (20.1, 13.4))
            ThreePointArc((20.1, 13.4), (23.635533906, 11.935533906), (25.1, 8.4))
            Line((25.1, 8.4), (25.1, 13.4))
        make_face()
    extrude(amount=-CUT_EXTRUDE2_DEPTH, mode=Mode.SUBTRACT)


solid = part.part
